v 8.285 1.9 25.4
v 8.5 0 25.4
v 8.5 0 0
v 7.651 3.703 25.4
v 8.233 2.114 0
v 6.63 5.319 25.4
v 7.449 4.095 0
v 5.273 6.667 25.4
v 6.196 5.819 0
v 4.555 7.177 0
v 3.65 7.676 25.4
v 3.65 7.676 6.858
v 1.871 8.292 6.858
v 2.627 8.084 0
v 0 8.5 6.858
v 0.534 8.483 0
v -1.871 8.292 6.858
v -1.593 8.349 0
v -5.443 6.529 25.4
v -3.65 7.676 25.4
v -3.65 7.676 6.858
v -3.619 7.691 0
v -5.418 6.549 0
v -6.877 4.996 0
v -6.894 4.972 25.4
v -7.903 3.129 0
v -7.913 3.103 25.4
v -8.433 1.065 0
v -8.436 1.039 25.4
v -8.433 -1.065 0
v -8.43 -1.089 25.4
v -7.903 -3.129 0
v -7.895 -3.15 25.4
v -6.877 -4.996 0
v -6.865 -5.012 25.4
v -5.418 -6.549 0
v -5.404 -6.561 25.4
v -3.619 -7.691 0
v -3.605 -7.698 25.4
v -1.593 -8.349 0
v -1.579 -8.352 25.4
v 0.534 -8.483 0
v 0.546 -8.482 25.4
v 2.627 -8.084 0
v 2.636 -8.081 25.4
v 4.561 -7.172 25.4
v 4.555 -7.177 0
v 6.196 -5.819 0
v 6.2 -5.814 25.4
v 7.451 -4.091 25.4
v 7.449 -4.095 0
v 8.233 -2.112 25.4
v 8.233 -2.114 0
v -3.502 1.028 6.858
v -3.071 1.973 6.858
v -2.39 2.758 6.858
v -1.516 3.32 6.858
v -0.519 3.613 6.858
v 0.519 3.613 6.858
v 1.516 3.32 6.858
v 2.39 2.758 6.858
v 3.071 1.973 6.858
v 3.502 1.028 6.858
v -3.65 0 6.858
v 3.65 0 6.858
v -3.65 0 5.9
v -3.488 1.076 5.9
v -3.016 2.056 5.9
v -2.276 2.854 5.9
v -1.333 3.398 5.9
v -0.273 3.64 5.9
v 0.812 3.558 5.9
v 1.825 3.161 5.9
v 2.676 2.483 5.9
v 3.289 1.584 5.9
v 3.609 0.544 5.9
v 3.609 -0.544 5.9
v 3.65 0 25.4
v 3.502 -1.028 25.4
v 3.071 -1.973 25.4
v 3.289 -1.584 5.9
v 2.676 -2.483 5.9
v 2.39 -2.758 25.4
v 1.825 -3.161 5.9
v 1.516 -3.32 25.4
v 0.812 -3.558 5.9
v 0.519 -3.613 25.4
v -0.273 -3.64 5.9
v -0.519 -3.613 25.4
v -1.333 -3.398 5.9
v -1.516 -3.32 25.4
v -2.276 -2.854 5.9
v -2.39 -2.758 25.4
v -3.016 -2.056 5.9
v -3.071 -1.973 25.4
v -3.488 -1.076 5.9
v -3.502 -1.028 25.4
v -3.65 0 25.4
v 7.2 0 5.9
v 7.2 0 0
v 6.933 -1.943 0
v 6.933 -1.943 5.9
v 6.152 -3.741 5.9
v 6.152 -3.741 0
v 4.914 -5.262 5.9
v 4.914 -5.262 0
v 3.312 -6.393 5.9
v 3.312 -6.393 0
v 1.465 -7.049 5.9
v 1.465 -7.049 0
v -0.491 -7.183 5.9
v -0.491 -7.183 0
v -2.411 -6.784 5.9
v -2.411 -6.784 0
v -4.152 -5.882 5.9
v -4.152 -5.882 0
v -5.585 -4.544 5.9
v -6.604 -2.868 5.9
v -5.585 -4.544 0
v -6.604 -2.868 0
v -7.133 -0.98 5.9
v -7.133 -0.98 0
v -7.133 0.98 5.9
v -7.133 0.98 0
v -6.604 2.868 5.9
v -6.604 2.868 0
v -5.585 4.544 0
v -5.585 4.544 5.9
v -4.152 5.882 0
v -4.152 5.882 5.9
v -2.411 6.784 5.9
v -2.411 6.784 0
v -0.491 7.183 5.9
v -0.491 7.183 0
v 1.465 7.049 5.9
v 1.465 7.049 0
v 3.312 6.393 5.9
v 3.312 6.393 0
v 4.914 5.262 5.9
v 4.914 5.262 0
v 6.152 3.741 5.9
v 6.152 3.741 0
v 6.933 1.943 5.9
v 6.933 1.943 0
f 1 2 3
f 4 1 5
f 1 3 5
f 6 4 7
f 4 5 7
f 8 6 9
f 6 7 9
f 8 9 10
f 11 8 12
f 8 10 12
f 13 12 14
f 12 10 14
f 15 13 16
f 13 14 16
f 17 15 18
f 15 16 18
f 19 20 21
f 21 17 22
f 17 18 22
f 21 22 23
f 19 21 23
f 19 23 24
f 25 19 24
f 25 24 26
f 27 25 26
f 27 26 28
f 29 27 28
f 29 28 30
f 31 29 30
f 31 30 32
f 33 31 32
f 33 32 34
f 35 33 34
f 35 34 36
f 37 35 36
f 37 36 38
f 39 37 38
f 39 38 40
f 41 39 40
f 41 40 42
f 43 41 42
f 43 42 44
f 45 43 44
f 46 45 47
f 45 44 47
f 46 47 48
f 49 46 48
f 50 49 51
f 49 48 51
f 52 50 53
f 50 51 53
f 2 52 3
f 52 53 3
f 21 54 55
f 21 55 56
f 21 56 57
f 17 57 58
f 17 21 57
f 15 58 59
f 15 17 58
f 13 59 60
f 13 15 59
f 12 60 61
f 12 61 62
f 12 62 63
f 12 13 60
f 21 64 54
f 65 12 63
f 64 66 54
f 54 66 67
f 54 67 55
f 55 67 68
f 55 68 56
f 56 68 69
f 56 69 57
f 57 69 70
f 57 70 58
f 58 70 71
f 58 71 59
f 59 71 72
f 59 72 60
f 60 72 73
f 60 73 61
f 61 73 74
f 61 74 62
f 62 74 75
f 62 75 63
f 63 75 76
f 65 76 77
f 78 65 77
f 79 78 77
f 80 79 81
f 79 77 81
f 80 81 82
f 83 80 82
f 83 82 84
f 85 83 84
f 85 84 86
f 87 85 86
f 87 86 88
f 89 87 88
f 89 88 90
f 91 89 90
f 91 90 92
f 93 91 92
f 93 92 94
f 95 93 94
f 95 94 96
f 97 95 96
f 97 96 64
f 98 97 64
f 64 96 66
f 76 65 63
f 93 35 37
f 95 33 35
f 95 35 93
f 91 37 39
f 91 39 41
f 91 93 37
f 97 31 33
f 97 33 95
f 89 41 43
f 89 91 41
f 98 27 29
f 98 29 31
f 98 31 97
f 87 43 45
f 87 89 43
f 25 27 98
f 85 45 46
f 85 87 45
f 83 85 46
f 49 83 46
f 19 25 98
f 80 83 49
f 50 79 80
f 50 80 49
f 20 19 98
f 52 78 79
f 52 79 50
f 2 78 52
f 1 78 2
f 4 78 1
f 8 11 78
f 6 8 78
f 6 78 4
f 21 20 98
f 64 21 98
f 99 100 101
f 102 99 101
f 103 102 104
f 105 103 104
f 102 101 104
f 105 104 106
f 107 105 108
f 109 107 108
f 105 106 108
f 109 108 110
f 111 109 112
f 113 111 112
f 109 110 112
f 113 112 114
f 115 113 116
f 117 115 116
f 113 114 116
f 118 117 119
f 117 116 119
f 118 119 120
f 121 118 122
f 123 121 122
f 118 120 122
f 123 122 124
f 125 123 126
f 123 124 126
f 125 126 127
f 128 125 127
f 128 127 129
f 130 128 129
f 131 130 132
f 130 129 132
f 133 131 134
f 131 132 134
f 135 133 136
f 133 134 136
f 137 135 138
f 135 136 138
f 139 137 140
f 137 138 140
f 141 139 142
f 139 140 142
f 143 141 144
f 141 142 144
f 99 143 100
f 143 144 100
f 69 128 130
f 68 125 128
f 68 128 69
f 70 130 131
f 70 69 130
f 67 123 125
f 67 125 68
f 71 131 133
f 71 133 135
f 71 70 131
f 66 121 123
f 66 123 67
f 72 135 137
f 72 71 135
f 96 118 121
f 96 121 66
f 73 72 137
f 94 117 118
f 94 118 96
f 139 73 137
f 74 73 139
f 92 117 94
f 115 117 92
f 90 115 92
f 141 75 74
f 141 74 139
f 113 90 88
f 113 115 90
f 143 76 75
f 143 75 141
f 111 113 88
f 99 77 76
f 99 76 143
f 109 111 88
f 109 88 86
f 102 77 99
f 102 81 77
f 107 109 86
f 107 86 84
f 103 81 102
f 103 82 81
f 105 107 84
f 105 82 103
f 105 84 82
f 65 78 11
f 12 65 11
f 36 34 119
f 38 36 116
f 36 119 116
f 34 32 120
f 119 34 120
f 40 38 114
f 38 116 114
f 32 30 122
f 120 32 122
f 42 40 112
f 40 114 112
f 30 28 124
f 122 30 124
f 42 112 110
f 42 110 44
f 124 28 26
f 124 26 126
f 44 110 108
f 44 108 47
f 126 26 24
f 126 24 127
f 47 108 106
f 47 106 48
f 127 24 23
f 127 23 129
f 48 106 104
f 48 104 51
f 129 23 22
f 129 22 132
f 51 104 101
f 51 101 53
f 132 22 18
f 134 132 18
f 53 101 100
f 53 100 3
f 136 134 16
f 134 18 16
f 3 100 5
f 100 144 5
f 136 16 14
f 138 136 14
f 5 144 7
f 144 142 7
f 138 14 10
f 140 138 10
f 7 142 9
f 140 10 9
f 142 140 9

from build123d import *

# Parameters (mm, degrees)
F0_R     = 8.5
F1_DEPTH = 25.4
F3_D     = 7.3
F5_DEPTH = 18.542
F6_R     = 7.2
F6_R_2   = 3.65
F7_DEPTH = 5.9


with BuildPart() as f1:
    # F0 (on Top) → F1 (new body)
    with BuildSketch(Plane.XY):
        Circle(F0_R)
    extrude(amount=F1_DEPTH)

    # F3 (through all)
    with Locations(Plane.XY.offset(25.4)):
        with Locations((0, 0)):
            Hole(F3_D / 2)

    # F4 (on face) → F5 (cut)
    with BuildSketch(Plane.XY.offset(25.4)):
        with BuildLine():
            Line((-3.65, 7.6764249492), (-3.65, 0))
            ThreePointArc((-3.65, 0), (0, 3.65), (3.65, 0))
            Line((3.65, 0), (3.65, 7.6764249492))
            ThreePointArc((3.65, 7.6764249492), (0, 8.5), (-3.65, 7.6764249492))
        make_face()
    extrude(amount=-F5_DEPTH, mode=Mode.SUBTRACT)

    # F6 (on face) → F7 (cut)
    with BuildSketch(Plane(origin=(0, 0, 0), x_dir=(1, 0, 0), z_dir=(0, 0, -1))):
        Circle(F6_R)
        Circle(F6_R_2, mode=Mode.SUBTRACT)
    extrude(amount=-F7_DEPTH, mode=Mode.SUBTRACT)


solid = f1.part
